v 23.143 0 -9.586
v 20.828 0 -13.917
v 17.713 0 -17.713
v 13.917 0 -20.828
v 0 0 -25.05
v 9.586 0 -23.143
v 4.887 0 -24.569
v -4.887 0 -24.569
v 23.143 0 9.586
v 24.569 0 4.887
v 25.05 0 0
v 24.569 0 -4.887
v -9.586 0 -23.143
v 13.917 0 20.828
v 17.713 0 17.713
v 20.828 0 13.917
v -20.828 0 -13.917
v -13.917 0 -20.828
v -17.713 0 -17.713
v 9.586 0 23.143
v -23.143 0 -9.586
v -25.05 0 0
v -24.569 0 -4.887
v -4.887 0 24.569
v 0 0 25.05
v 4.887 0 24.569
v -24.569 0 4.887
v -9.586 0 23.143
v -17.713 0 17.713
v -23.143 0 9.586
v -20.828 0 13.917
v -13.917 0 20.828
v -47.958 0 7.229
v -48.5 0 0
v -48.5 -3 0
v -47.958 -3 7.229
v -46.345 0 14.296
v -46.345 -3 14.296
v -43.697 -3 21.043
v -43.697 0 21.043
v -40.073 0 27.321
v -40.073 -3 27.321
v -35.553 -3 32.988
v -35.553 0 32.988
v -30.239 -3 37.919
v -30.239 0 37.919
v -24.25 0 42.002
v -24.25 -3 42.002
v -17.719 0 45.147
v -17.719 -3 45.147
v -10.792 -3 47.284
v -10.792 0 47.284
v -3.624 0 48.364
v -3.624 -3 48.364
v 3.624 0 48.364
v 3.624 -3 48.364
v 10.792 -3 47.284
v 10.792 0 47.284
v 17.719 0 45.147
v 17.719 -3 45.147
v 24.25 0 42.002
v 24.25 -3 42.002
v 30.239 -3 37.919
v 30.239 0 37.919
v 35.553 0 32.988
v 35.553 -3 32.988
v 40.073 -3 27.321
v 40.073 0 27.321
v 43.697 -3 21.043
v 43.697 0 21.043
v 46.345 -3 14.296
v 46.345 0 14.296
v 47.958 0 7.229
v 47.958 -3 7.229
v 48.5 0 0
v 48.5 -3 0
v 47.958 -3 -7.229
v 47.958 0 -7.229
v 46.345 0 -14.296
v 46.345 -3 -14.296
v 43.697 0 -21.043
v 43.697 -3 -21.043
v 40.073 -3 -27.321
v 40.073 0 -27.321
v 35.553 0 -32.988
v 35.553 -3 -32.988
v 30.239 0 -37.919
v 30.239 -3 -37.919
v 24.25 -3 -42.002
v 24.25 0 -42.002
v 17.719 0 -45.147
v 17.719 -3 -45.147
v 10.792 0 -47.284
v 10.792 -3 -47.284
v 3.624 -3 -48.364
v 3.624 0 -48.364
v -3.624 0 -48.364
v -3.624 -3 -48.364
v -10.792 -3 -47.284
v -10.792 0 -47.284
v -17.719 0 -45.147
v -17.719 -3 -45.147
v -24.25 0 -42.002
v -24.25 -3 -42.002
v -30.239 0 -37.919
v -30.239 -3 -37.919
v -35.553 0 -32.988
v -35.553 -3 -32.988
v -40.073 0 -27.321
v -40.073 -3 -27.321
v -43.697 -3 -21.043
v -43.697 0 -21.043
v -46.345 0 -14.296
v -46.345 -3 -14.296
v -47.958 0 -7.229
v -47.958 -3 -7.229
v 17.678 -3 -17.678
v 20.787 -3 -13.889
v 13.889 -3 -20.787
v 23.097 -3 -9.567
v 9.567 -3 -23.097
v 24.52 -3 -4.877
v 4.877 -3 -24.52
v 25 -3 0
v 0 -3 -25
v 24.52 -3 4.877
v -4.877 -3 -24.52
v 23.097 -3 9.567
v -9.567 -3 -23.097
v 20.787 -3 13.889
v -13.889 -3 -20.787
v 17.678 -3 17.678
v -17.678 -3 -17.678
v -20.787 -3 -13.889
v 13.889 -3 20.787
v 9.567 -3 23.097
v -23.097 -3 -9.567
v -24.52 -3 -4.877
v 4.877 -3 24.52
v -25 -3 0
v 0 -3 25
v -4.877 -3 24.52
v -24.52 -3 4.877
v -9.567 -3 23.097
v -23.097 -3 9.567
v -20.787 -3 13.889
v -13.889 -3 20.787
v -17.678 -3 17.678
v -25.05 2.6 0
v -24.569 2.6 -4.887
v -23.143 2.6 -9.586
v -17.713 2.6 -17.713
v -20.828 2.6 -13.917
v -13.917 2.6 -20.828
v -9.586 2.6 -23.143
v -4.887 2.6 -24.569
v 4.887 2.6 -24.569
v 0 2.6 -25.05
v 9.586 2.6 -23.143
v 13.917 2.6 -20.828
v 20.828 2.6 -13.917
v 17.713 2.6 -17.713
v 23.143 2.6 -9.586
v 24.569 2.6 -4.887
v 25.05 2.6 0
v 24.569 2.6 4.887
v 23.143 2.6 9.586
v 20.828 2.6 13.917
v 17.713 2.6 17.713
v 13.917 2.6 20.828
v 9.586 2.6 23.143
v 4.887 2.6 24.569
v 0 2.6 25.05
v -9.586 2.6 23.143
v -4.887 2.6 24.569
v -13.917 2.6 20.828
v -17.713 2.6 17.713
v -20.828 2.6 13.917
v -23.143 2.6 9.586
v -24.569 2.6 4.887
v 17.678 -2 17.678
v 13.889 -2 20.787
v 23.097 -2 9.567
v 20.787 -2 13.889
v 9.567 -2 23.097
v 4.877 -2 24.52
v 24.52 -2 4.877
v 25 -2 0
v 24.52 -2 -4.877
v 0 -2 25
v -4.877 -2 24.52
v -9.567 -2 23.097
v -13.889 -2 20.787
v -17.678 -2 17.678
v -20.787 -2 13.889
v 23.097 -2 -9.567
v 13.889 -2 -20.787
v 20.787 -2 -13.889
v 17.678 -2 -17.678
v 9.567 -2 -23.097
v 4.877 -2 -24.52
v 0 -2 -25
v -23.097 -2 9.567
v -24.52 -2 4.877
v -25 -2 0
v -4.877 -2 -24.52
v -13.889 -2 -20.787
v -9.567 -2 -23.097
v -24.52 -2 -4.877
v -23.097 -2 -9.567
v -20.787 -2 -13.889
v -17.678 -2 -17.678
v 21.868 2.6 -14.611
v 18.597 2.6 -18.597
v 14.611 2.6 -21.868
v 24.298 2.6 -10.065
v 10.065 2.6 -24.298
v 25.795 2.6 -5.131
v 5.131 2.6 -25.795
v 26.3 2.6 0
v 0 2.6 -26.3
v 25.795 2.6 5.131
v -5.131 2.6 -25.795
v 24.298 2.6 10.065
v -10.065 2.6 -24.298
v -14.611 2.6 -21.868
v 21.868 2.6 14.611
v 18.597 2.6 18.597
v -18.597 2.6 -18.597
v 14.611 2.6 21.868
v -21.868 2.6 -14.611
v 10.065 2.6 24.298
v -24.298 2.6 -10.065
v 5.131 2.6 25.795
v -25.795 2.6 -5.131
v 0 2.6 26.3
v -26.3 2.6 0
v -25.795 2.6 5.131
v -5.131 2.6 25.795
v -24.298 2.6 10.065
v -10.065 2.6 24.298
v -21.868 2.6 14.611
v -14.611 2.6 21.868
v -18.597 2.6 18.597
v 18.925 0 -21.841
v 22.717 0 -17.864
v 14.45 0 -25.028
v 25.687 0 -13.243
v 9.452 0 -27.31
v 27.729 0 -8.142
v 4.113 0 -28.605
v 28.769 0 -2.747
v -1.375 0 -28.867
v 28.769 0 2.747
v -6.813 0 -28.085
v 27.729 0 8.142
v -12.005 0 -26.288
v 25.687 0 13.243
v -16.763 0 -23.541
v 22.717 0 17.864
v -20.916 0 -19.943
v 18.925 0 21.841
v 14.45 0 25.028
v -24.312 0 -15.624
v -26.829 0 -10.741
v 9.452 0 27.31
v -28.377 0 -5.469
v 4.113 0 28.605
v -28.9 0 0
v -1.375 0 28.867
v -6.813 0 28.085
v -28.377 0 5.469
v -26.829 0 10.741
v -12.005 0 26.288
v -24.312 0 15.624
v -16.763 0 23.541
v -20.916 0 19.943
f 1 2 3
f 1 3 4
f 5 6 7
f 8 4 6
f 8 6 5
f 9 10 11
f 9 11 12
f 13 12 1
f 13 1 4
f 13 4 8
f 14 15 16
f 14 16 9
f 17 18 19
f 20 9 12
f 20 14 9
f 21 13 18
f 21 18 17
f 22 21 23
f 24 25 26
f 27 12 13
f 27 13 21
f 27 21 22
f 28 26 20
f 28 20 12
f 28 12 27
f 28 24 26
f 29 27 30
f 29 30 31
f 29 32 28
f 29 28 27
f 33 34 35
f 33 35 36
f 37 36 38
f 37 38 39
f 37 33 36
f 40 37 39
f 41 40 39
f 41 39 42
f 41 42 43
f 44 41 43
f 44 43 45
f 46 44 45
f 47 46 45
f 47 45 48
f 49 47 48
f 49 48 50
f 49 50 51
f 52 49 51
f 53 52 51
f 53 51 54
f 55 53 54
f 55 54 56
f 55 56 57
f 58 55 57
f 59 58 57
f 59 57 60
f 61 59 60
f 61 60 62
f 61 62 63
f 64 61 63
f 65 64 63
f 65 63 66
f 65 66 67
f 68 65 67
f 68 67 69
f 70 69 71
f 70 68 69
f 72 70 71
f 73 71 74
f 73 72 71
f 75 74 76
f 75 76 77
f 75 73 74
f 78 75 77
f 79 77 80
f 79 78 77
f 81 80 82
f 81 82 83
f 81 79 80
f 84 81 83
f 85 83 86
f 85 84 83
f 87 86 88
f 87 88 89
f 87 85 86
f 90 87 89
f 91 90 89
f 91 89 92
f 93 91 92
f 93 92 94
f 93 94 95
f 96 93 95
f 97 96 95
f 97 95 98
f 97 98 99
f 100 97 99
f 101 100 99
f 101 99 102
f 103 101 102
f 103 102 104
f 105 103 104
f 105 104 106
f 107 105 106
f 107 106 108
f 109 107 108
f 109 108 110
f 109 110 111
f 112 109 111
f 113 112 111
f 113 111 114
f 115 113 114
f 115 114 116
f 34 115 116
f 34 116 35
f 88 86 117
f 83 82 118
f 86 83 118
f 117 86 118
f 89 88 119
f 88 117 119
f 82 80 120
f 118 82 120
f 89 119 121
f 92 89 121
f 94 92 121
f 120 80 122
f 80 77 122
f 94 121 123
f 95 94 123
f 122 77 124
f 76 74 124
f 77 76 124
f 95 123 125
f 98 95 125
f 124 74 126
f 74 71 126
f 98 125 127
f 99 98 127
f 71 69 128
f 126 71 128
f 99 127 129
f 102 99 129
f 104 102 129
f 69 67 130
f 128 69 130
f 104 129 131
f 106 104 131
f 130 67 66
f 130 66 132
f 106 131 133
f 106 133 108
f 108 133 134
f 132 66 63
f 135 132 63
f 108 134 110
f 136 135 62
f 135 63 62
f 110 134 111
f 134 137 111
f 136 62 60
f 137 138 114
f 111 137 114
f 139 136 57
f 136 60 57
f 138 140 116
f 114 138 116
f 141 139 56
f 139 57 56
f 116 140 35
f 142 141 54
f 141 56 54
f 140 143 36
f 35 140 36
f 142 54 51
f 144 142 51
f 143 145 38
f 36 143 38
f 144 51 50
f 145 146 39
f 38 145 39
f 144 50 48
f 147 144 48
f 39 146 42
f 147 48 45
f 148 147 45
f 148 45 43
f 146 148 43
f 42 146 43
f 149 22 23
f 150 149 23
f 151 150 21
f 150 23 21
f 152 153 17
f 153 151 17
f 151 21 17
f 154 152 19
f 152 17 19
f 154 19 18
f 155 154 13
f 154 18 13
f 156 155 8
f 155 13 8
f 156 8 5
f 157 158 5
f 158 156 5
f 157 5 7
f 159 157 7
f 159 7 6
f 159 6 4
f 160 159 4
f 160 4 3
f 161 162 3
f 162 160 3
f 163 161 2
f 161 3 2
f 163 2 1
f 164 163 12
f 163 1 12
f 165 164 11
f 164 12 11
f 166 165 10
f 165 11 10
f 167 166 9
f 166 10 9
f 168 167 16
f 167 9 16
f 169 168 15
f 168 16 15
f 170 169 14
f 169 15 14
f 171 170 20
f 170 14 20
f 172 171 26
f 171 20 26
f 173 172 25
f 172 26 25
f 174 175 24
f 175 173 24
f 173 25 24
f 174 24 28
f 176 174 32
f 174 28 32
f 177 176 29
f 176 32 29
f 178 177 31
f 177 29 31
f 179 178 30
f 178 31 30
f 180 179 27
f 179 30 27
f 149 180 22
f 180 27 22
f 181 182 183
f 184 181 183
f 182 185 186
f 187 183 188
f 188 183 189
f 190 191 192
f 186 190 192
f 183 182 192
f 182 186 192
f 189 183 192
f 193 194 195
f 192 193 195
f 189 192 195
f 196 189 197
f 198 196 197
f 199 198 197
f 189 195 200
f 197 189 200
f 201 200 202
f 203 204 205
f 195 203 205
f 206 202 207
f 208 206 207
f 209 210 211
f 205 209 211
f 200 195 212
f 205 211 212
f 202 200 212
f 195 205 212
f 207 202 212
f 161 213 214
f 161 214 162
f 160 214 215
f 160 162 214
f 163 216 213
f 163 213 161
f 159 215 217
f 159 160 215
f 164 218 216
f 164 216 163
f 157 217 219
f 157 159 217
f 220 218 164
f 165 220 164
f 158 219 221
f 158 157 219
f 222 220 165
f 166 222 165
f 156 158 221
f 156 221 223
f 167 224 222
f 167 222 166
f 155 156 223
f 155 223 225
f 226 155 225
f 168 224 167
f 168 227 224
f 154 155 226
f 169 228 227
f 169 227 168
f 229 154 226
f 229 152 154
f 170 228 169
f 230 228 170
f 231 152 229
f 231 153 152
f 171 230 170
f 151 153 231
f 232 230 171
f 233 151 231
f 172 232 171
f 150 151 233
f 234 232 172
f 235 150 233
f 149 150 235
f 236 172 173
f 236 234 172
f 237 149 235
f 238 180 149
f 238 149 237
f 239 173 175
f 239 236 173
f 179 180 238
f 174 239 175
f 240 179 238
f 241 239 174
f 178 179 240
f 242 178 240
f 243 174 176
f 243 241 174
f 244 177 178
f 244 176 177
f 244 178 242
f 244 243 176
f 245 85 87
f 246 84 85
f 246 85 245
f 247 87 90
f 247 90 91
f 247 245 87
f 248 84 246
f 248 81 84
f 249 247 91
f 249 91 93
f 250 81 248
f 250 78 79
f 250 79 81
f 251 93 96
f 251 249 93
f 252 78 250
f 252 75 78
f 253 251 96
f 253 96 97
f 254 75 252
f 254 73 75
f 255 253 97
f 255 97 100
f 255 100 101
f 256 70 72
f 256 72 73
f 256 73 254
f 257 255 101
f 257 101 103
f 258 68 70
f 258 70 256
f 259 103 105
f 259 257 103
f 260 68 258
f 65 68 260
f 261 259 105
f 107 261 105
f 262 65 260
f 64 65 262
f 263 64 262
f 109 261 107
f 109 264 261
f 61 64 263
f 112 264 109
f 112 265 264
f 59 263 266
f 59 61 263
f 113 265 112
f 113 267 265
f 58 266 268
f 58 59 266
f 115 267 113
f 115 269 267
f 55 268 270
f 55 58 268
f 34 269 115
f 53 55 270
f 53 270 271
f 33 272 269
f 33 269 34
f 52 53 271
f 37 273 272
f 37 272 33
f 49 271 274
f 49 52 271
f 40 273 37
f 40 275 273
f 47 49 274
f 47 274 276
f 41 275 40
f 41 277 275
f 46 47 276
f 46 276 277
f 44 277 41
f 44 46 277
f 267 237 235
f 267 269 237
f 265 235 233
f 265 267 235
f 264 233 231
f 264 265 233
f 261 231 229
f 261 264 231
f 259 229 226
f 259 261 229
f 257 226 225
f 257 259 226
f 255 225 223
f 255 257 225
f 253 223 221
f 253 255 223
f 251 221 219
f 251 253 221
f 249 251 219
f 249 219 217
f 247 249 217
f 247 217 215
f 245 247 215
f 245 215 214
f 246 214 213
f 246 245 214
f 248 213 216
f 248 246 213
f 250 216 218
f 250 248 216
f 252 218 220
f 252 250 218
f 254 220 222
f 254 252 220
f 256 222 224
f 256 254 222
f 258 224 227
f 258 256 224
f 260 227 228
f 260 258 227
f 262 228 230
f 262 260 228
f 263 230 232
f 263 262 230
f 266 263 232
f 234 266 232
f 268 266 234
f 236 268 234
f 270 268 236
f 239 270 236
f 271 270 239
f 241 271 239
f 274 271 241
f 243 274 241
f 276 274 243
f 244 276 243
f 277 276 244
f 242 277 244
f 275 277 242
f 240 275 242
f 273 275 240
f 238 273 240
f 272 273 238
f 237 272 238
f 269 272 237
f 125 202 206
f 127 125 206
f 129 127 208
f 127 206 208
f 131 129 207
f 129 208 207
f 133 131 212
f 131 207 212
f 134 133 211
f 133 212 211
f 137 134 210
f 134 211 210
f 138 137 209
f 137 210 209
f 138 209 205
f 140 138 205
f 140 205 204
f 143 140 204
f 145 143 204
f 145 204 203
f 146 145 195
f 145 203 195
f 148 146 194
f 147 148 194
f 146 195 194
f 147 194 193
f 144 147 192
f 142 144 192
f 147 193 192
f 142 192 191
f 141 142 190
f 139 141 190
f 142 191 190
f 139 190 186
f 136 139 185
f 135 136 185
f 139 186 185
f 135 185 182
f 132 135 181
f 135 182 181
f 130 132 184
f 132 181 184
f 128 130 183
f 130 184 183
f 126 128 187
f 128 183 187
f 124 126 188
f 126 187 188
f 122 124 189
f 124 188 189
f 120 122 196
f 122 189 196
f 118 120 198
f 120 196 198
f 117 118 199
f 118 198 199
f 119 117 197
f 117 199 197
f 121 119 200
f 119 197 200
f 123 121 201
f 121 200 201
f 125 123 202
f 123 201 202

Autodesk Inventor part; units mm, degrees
ref_plane "YZ Plane" through (0, 0, 0) normal (1, 0, 0) x (0, 1, 0)
ref_plane "XZ Plane" through (0, 0, 0) normal (0, 1, 0) x (-1, 0, 0)
ref_plane "XY Plane" through (0, 0, 0) normal (0, 0, 1) x (1, 0, 0)
sketch "Эскиз1" plane through (0, 0, 0) normal (0, 1, 0) x (-1, 0, 0)
  circle A0 centre (0, 0) radius 25.05
  circle A1 centre (0, 0) radius 48.5
  circle A2 centre (0, 0) radius 26.3
  dimension "d1" = 50.1
  dimension "d2" = 97
  dimension "d3" = 52.6
extrude "Выдавливание1" add sketch "Эскиз1" against normal blind 3 contours A0 | A1 | A2
extrude "Выдавливание2" add sketch "Эскиз1" along normal blind 2.6 contours A2
sketch "Эскиз2" plane through (0, -3, 0) normal (0, -1, 0) x (1, 0, 0)
  point P0 (0, 0)
hole "Отверстие1" at (0, -3, 0) direction (0, 1, 0) diameter 50 depth 1
chamfer "Фаска1" distance 2.6 angle 45 1 edges at (26.3, 0, 0)
properties part number "навес над зеркалом"
